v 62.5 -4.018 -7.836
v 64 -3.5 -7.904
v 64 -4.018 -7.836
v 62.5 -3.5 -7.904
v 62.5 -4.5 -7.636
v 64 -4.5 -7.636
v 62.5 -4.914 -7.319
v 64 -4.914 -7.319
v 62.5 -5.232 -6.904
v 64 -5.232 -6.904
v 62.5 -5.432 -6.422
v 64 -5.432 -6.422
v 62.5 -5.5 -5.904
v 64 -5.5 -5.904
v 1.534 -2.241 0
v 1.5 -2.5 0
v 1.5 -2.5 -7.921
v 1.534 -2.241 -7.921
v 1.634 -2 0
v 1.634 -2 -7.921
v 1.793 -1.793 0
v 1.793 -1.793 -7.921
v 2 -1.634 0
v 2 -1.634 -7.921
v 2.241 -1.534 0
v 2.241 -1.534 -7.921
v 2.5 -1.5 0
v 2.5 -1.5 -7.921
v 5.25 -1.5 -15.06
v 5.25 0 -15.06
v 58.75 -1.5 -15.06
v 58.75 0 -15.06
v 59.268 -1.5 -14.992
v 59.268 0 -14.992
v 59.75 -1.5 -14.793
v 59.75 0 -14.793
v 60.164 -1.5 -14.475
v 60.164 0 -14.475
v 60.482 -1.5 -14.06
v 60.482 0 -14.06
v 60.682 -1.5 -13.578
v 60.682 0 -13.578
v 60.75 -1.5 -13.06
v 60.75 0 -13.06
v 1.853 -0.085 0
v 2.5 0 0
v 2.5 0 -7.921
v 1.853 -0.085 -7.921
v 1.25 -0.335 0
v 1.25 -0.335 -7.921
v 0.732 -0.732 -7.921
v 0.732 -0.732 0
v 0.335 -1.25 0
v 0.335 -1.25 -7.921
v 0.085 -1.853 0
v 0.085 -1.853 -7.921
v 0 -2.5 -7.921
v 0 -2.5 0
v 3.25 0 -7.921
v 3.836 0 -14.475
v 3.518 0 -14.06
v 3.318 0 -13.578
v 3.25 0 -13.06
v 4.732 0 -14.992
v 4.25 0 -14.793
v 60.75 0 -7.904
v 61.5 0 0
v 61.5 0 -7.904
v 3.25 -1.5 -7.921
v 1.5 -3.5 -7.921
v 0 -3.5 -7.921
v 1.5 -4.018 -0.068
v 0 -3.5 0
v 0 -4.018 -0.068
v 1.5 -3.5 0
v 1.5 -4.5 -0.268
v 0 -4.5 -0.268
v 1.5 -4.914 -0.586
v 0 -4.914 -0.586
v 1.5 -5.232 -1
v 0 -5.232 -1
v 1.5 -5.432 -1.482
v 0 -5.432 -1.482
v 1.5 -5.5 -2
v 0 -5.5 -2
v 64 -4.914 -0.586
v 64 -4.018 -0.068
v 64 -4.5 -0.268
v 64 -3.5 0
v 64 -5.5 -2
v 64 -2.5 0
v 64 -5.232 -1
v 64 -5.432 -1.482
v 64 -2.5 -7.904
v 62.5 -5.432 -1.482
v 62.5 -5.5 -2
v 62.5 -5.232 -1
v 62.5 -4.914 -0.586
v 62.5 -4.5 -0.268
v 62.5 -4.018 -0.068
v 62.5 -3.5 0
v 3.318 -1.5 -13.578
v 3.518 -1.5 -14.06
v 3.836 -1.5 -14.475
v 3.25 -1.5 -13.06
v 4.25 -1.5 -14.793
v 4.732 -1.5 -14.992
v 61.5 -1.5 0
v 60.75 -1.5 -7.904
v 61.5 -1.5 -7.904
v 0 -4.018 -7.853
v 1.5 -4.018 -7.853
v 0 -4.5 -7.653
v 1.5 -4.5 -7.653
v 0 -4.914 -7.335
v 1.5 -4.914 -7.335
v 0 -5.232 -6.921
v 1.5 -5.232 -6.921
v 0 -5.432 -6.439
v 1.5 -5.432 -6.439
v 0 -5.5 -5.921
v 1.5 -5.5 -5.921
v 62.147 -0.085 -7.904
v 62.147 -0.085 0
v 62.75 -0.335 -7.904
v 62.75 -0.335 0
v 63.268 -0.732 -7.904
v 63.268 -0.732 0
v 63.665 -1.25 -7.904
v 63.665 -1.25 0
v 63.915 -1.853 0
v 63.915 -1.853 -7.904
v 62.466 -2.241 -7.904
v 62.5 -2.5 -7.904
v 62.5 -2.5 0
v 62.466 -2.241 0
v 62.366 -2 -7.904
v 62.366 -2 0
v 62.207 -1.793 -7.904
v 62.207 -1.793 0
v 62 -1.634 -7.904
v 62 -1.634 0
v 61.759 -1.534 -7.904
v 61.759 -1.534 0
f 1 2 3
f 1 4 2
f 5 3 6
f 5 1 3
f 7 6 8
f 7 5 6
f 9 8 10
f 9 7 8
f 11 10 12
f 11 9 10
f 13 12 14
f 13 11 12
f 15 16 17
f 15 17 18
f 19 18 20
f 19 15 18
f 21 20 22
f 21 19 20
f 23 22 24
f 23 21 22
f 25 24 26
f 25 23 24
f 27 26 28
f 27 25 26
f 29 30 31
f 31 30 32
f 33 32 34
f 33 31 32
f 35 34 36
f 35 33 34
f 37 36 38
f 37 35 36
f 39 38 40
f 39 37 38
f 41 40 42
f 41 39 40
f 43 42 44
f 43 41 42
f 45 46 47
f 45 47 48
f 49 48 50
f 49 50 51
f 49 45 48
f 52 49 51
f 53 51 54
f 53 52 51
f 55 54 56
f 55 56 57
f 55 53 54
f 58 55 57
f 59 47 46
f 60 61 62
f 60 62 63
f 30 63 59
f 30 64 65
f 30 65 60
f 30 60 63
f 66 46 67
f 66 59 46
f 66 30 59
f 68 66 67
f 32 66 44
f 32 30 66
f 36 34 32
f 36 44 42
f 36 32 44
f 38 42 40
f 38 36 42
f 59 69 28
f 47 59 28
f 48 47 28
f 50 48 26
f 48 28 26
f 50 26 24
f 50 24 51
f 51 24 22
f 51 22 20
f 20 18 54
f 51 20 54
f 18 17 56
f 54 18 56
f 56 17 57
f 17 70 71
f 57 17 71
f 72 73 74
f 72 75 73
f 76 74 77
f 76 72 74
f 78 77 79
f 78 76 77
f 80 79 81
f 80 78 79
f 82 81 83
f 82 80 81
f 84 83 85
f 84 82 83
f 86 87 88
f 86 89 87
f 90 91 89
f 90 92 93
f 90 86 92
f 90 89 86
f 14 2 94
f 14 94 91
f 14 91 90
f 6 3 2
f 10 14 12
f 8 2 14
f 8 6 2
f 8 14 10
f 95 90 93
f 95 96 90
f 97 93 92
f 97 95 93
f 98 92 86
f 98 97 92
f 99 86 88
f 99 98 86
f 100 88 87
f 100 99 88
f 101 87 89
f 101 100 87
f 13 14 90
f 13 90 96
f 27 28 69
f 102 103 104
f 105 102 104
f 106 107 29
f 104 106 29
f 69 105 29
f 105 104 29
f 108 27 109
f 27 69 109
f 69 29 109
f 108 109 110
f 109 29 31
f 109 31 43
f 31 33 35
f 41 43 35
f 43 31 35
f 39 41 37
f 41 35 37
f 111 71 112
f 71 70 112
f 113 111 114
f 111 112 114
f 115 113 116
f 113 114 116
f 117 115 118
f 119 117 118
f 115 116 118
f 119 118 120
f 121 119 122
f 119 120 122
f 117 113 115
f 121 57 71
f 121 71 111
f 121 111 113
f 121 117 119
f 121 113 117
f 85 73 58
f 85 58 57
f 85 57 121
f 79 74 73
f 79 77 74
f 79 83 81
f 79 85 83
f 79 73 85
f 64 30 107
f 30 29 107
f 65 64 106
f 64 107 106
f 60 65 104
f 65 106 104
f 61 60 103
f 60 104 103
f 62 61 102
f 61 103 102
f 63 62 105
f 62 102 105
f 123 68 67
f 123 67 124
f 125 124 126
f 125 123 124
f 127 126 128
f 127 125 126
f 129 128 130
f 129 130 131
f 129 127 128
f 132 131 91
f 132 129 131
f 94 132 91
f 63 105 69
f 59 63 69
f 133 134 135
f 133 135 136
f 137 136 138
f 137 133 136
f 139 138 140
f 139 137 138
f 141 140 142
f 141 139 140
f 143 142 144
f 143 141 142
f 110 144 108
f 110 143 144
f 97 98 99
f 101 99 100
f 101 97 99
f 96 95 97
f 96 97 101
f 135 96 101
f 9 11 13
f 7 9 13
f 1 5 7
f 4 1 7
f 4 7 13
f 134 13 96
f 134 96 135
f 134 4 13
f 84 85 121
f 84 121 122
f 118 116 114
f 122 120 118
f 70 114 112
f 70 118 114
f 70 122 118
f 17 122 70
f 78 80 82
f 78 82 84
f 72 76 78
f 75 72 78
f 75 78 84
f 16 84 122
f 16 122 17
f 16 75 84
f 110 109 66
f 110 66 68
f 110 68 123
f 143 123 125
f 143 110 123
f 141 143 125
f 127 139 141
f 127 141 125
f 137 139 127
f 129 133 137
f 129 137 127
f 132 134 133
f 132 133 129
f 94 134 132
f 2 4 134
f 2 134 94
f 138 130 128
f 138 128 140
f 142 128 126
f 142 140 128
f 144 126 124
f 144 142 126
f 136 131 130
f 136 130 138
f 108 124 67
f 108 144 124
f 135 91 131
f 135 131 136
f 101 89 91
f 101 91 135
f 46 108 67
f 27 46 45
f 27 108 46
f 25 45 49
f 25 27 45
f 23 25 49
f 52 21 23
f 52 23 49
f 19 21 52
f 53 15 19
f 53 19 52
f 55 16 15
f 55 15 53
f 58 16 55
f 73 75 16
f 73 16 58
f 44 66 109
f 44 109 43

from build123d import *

# Parameters (mm, degrees)
SKETCH1_W                       = 64
SKETCH1_H                       = 15.060468003
BASE_FLANGE1_DEPTH              = 1.5
EDGE_FLANGE1_STRIP_W            = 8
EDGE_FLANGE1_STRIP_H            = 1.5
EDGE_FLANGE1_STRIP_CUT_DEPTH    = 7.904411042
EDGE_FLANGE1_RELIEF_W           = 8.75
EDGE_FLANGE1_RELIEF_H           = 0.75
EDGE_FLANGE1_RELIEF_CUT_DEPTH   = 1.5
EDGE_FLANGE1_STRIP_2_W          = 8
EDGE_FLANGE1_STRIP_2_H          = 1.5
EDGE_FLANGE1_STRIP_CUT_2_DEPTH  = 7.92099203
EDGE_FLANGE1_RELIEF_2_W         = 8.75
EDGE_FLANGE1_RELIEF_2_H         = 0.75
EDGE_FLANGE1_RELIEF_CUT_2_DEPTH = 1.5
EDGE_FLANGE1_DEPTH              = 7.904411042
EDGE_FLANGE1_BEND_DEPTH         = 7.92099203
SKETCH31_W                      = 3.25
SKETCH31_H                      = 6.406056961
SKETCH31_H_2                    = 6.389475973
CUT_EXTRUDE1_DEPTH              = 10
FILLET1_R                       = 2


# Sheet-metal steps are written as plain solids
with BuildPart() as part:
    # Sketch1 → Base-Flange1 (new body)
    with BuildSketch(Plane(origin=(0, 0, 0), x_dir=(1, 0, 0), z_dir=(0, 1, 0))):
        with Locations((32, 7.530234002)):
            Rectangle(SKETCH1_W, SKETCH1_H)
    extrude(amount=-BASE_FLANGE1_DEPTH)

    # Edge-Flange1 strip (across the edge) → Edge-Flange1 strip cut (cut)
    with BuildSketch(Plane(origin=(64, -1.5, -7.904411042), x_dir=(-1, 0, 0), z_dir=(0, 0, 1))):
        with Locations((-1.5, -0.75)):
            Rectangle(EDGE_FLANGE1_STRIP_W, EDGE_FLANGE1_STRIP_H)
    extrude(amount=EDGE_FLANGE1_STRIP_CUT_DEPTH, mode=Mode.SUBTRACT)

    # Edge-Flange1 relief (on the sheet) → Edge-Flange1 relief cut (cut)
    with BuildSketch(Plane(origin=(61.5, -1.5, -7.904411042), x_dir=(-1, 0, 0), z_dir=(0, -1, 0))):
        with Locations((-3.625, 0.375)):
            Rectangle(EDGE_FLANGE1_RELIEF_W, EDGE_FLANGE1_RELIEF_H)
    extrude(amount=-EDGE_FLANGE1_RELIEF_CUT_DEPTH, mode=Mode.SUBTRACT)

    # Edge-Flange1 strip 2 (across the edge) → Edge-Flange1 strip cut 2 (cut)
    with BuildSketch(Plane(origin=(0, -1.5, 0), x_dir=(1, 0, 0), z_dir=(0, 0, -1))):
        with Locations((-1.5, -0.75)):
            Rectangle(EDGE_FLANGE1_STRIP_2_W, EDGE_FLANGE1_STRIP_2_H)
    extrude(amount=EDGE_FLANGE1_STRIP_CUT_2_DEPTH, mode=Mode.SUBTRACT)

    # Edge-Flange1 relief 2 (on the sheet) → Edge-Flange1 relief cut 2 (cut)
    with BuildSketch(Plane(origin=(2.5, -1.5, 0), x_dir=(1, 0, 0), z_dir=(0, -1, 0))):
        with Locations((-3.625, -8.29599203)):
            Rectangle(EDGE_FLANGE1_RELIEF_2_W, EDGE_FLANGE1_RELIEF_2_H)
    extrude(amount=-EDGE_FLANGE1_RELIEF_CUT_2_DEPTH, mode=Mode.SUBTRACT)

    # Edge-Flange1 section (across the edge) → Edge-Flange1 (add)
    with BuildSketch(Plane(origin=(64, -1.5, -7.904411042), x_dir=(-1, 0, 0), z_dir=(0, 0, 1))):
        with BuildLine():
            Line((0, 1), (0, 4))
            Line((0, 4), (1.5, 4))
            Line((1.5, 4), (1.5, 1))
            ThreePointArc((1.5, 1), (1.792893219, 0.292893219), (2.5, 0))
            Line((2.5, 0), (2.5, -1.5))
            ThreePointArc((2.5, -1.5), (0.732233047, -0.767766953), (0, 1))
        make_face()
    extrude(amount=EDGE_FLANGE1_DEPTH)

    # Edge-Flange1 section 2 (across the edge) → Edge-Flange1 bend (add)
    with BuildSketch(Plane(origin=(0, -1.5, 0), x_dir=(1, 0, 0), z_dir=(0, 0, -1))):
        with BuildLine():
            Line((0, 1), (0, 4))
            Line((0, 4), (1.5, 4))
            Line((1.5, 4), (1.5, 1))
            ThreePointArc((1.5, 1), (1.792893219, 0.292893219), (2.5, 0))
            Line((2.5, 0), (2.5, -1.5))
            ThreePointArc((2.5, -1.5), (0.732233047, -0.767766953), (0, 1))
        make_face()
    extrude(amount=EDGE_FLANGE1_BEND_DEPTH)

    # Sketch31 → Cut-Extrude1 (cut)
    with BuildSketch(Plane(origin=(0, 0, 0), x_dir=(1, 0, 0), z_dir=(0, 1, 0))):
        with Locations((62.375, 11.857439523)):
            Rectangle(SKETCH31_W, SKETCH31_H)
        with Locations((1.625, 11.865730017)):
            Rectangle(SKETCH31_W, SKETCH31_H_2)
    extrude(amount=-CUT_EXTRUDE1_DEPTH, mode=Mode.SUBTRACT)

    # Fillet1
    fillet1_edges = [part.edges().sort_by_distance(p)[0] for p in [
        (60.75, -0.75, -15.060468003),
        (3.25, -0.75, -15.060468003),
        (63.25, -5.5, -7.904411042),
        (63.25, -5.5, 0),
        (0.75, -5.5, 0),
        (0.75, -5.5, -7.92099203),
    ]]
    fillet(fillet1_edges, radius=FILLET1_R)


solid = part.part
